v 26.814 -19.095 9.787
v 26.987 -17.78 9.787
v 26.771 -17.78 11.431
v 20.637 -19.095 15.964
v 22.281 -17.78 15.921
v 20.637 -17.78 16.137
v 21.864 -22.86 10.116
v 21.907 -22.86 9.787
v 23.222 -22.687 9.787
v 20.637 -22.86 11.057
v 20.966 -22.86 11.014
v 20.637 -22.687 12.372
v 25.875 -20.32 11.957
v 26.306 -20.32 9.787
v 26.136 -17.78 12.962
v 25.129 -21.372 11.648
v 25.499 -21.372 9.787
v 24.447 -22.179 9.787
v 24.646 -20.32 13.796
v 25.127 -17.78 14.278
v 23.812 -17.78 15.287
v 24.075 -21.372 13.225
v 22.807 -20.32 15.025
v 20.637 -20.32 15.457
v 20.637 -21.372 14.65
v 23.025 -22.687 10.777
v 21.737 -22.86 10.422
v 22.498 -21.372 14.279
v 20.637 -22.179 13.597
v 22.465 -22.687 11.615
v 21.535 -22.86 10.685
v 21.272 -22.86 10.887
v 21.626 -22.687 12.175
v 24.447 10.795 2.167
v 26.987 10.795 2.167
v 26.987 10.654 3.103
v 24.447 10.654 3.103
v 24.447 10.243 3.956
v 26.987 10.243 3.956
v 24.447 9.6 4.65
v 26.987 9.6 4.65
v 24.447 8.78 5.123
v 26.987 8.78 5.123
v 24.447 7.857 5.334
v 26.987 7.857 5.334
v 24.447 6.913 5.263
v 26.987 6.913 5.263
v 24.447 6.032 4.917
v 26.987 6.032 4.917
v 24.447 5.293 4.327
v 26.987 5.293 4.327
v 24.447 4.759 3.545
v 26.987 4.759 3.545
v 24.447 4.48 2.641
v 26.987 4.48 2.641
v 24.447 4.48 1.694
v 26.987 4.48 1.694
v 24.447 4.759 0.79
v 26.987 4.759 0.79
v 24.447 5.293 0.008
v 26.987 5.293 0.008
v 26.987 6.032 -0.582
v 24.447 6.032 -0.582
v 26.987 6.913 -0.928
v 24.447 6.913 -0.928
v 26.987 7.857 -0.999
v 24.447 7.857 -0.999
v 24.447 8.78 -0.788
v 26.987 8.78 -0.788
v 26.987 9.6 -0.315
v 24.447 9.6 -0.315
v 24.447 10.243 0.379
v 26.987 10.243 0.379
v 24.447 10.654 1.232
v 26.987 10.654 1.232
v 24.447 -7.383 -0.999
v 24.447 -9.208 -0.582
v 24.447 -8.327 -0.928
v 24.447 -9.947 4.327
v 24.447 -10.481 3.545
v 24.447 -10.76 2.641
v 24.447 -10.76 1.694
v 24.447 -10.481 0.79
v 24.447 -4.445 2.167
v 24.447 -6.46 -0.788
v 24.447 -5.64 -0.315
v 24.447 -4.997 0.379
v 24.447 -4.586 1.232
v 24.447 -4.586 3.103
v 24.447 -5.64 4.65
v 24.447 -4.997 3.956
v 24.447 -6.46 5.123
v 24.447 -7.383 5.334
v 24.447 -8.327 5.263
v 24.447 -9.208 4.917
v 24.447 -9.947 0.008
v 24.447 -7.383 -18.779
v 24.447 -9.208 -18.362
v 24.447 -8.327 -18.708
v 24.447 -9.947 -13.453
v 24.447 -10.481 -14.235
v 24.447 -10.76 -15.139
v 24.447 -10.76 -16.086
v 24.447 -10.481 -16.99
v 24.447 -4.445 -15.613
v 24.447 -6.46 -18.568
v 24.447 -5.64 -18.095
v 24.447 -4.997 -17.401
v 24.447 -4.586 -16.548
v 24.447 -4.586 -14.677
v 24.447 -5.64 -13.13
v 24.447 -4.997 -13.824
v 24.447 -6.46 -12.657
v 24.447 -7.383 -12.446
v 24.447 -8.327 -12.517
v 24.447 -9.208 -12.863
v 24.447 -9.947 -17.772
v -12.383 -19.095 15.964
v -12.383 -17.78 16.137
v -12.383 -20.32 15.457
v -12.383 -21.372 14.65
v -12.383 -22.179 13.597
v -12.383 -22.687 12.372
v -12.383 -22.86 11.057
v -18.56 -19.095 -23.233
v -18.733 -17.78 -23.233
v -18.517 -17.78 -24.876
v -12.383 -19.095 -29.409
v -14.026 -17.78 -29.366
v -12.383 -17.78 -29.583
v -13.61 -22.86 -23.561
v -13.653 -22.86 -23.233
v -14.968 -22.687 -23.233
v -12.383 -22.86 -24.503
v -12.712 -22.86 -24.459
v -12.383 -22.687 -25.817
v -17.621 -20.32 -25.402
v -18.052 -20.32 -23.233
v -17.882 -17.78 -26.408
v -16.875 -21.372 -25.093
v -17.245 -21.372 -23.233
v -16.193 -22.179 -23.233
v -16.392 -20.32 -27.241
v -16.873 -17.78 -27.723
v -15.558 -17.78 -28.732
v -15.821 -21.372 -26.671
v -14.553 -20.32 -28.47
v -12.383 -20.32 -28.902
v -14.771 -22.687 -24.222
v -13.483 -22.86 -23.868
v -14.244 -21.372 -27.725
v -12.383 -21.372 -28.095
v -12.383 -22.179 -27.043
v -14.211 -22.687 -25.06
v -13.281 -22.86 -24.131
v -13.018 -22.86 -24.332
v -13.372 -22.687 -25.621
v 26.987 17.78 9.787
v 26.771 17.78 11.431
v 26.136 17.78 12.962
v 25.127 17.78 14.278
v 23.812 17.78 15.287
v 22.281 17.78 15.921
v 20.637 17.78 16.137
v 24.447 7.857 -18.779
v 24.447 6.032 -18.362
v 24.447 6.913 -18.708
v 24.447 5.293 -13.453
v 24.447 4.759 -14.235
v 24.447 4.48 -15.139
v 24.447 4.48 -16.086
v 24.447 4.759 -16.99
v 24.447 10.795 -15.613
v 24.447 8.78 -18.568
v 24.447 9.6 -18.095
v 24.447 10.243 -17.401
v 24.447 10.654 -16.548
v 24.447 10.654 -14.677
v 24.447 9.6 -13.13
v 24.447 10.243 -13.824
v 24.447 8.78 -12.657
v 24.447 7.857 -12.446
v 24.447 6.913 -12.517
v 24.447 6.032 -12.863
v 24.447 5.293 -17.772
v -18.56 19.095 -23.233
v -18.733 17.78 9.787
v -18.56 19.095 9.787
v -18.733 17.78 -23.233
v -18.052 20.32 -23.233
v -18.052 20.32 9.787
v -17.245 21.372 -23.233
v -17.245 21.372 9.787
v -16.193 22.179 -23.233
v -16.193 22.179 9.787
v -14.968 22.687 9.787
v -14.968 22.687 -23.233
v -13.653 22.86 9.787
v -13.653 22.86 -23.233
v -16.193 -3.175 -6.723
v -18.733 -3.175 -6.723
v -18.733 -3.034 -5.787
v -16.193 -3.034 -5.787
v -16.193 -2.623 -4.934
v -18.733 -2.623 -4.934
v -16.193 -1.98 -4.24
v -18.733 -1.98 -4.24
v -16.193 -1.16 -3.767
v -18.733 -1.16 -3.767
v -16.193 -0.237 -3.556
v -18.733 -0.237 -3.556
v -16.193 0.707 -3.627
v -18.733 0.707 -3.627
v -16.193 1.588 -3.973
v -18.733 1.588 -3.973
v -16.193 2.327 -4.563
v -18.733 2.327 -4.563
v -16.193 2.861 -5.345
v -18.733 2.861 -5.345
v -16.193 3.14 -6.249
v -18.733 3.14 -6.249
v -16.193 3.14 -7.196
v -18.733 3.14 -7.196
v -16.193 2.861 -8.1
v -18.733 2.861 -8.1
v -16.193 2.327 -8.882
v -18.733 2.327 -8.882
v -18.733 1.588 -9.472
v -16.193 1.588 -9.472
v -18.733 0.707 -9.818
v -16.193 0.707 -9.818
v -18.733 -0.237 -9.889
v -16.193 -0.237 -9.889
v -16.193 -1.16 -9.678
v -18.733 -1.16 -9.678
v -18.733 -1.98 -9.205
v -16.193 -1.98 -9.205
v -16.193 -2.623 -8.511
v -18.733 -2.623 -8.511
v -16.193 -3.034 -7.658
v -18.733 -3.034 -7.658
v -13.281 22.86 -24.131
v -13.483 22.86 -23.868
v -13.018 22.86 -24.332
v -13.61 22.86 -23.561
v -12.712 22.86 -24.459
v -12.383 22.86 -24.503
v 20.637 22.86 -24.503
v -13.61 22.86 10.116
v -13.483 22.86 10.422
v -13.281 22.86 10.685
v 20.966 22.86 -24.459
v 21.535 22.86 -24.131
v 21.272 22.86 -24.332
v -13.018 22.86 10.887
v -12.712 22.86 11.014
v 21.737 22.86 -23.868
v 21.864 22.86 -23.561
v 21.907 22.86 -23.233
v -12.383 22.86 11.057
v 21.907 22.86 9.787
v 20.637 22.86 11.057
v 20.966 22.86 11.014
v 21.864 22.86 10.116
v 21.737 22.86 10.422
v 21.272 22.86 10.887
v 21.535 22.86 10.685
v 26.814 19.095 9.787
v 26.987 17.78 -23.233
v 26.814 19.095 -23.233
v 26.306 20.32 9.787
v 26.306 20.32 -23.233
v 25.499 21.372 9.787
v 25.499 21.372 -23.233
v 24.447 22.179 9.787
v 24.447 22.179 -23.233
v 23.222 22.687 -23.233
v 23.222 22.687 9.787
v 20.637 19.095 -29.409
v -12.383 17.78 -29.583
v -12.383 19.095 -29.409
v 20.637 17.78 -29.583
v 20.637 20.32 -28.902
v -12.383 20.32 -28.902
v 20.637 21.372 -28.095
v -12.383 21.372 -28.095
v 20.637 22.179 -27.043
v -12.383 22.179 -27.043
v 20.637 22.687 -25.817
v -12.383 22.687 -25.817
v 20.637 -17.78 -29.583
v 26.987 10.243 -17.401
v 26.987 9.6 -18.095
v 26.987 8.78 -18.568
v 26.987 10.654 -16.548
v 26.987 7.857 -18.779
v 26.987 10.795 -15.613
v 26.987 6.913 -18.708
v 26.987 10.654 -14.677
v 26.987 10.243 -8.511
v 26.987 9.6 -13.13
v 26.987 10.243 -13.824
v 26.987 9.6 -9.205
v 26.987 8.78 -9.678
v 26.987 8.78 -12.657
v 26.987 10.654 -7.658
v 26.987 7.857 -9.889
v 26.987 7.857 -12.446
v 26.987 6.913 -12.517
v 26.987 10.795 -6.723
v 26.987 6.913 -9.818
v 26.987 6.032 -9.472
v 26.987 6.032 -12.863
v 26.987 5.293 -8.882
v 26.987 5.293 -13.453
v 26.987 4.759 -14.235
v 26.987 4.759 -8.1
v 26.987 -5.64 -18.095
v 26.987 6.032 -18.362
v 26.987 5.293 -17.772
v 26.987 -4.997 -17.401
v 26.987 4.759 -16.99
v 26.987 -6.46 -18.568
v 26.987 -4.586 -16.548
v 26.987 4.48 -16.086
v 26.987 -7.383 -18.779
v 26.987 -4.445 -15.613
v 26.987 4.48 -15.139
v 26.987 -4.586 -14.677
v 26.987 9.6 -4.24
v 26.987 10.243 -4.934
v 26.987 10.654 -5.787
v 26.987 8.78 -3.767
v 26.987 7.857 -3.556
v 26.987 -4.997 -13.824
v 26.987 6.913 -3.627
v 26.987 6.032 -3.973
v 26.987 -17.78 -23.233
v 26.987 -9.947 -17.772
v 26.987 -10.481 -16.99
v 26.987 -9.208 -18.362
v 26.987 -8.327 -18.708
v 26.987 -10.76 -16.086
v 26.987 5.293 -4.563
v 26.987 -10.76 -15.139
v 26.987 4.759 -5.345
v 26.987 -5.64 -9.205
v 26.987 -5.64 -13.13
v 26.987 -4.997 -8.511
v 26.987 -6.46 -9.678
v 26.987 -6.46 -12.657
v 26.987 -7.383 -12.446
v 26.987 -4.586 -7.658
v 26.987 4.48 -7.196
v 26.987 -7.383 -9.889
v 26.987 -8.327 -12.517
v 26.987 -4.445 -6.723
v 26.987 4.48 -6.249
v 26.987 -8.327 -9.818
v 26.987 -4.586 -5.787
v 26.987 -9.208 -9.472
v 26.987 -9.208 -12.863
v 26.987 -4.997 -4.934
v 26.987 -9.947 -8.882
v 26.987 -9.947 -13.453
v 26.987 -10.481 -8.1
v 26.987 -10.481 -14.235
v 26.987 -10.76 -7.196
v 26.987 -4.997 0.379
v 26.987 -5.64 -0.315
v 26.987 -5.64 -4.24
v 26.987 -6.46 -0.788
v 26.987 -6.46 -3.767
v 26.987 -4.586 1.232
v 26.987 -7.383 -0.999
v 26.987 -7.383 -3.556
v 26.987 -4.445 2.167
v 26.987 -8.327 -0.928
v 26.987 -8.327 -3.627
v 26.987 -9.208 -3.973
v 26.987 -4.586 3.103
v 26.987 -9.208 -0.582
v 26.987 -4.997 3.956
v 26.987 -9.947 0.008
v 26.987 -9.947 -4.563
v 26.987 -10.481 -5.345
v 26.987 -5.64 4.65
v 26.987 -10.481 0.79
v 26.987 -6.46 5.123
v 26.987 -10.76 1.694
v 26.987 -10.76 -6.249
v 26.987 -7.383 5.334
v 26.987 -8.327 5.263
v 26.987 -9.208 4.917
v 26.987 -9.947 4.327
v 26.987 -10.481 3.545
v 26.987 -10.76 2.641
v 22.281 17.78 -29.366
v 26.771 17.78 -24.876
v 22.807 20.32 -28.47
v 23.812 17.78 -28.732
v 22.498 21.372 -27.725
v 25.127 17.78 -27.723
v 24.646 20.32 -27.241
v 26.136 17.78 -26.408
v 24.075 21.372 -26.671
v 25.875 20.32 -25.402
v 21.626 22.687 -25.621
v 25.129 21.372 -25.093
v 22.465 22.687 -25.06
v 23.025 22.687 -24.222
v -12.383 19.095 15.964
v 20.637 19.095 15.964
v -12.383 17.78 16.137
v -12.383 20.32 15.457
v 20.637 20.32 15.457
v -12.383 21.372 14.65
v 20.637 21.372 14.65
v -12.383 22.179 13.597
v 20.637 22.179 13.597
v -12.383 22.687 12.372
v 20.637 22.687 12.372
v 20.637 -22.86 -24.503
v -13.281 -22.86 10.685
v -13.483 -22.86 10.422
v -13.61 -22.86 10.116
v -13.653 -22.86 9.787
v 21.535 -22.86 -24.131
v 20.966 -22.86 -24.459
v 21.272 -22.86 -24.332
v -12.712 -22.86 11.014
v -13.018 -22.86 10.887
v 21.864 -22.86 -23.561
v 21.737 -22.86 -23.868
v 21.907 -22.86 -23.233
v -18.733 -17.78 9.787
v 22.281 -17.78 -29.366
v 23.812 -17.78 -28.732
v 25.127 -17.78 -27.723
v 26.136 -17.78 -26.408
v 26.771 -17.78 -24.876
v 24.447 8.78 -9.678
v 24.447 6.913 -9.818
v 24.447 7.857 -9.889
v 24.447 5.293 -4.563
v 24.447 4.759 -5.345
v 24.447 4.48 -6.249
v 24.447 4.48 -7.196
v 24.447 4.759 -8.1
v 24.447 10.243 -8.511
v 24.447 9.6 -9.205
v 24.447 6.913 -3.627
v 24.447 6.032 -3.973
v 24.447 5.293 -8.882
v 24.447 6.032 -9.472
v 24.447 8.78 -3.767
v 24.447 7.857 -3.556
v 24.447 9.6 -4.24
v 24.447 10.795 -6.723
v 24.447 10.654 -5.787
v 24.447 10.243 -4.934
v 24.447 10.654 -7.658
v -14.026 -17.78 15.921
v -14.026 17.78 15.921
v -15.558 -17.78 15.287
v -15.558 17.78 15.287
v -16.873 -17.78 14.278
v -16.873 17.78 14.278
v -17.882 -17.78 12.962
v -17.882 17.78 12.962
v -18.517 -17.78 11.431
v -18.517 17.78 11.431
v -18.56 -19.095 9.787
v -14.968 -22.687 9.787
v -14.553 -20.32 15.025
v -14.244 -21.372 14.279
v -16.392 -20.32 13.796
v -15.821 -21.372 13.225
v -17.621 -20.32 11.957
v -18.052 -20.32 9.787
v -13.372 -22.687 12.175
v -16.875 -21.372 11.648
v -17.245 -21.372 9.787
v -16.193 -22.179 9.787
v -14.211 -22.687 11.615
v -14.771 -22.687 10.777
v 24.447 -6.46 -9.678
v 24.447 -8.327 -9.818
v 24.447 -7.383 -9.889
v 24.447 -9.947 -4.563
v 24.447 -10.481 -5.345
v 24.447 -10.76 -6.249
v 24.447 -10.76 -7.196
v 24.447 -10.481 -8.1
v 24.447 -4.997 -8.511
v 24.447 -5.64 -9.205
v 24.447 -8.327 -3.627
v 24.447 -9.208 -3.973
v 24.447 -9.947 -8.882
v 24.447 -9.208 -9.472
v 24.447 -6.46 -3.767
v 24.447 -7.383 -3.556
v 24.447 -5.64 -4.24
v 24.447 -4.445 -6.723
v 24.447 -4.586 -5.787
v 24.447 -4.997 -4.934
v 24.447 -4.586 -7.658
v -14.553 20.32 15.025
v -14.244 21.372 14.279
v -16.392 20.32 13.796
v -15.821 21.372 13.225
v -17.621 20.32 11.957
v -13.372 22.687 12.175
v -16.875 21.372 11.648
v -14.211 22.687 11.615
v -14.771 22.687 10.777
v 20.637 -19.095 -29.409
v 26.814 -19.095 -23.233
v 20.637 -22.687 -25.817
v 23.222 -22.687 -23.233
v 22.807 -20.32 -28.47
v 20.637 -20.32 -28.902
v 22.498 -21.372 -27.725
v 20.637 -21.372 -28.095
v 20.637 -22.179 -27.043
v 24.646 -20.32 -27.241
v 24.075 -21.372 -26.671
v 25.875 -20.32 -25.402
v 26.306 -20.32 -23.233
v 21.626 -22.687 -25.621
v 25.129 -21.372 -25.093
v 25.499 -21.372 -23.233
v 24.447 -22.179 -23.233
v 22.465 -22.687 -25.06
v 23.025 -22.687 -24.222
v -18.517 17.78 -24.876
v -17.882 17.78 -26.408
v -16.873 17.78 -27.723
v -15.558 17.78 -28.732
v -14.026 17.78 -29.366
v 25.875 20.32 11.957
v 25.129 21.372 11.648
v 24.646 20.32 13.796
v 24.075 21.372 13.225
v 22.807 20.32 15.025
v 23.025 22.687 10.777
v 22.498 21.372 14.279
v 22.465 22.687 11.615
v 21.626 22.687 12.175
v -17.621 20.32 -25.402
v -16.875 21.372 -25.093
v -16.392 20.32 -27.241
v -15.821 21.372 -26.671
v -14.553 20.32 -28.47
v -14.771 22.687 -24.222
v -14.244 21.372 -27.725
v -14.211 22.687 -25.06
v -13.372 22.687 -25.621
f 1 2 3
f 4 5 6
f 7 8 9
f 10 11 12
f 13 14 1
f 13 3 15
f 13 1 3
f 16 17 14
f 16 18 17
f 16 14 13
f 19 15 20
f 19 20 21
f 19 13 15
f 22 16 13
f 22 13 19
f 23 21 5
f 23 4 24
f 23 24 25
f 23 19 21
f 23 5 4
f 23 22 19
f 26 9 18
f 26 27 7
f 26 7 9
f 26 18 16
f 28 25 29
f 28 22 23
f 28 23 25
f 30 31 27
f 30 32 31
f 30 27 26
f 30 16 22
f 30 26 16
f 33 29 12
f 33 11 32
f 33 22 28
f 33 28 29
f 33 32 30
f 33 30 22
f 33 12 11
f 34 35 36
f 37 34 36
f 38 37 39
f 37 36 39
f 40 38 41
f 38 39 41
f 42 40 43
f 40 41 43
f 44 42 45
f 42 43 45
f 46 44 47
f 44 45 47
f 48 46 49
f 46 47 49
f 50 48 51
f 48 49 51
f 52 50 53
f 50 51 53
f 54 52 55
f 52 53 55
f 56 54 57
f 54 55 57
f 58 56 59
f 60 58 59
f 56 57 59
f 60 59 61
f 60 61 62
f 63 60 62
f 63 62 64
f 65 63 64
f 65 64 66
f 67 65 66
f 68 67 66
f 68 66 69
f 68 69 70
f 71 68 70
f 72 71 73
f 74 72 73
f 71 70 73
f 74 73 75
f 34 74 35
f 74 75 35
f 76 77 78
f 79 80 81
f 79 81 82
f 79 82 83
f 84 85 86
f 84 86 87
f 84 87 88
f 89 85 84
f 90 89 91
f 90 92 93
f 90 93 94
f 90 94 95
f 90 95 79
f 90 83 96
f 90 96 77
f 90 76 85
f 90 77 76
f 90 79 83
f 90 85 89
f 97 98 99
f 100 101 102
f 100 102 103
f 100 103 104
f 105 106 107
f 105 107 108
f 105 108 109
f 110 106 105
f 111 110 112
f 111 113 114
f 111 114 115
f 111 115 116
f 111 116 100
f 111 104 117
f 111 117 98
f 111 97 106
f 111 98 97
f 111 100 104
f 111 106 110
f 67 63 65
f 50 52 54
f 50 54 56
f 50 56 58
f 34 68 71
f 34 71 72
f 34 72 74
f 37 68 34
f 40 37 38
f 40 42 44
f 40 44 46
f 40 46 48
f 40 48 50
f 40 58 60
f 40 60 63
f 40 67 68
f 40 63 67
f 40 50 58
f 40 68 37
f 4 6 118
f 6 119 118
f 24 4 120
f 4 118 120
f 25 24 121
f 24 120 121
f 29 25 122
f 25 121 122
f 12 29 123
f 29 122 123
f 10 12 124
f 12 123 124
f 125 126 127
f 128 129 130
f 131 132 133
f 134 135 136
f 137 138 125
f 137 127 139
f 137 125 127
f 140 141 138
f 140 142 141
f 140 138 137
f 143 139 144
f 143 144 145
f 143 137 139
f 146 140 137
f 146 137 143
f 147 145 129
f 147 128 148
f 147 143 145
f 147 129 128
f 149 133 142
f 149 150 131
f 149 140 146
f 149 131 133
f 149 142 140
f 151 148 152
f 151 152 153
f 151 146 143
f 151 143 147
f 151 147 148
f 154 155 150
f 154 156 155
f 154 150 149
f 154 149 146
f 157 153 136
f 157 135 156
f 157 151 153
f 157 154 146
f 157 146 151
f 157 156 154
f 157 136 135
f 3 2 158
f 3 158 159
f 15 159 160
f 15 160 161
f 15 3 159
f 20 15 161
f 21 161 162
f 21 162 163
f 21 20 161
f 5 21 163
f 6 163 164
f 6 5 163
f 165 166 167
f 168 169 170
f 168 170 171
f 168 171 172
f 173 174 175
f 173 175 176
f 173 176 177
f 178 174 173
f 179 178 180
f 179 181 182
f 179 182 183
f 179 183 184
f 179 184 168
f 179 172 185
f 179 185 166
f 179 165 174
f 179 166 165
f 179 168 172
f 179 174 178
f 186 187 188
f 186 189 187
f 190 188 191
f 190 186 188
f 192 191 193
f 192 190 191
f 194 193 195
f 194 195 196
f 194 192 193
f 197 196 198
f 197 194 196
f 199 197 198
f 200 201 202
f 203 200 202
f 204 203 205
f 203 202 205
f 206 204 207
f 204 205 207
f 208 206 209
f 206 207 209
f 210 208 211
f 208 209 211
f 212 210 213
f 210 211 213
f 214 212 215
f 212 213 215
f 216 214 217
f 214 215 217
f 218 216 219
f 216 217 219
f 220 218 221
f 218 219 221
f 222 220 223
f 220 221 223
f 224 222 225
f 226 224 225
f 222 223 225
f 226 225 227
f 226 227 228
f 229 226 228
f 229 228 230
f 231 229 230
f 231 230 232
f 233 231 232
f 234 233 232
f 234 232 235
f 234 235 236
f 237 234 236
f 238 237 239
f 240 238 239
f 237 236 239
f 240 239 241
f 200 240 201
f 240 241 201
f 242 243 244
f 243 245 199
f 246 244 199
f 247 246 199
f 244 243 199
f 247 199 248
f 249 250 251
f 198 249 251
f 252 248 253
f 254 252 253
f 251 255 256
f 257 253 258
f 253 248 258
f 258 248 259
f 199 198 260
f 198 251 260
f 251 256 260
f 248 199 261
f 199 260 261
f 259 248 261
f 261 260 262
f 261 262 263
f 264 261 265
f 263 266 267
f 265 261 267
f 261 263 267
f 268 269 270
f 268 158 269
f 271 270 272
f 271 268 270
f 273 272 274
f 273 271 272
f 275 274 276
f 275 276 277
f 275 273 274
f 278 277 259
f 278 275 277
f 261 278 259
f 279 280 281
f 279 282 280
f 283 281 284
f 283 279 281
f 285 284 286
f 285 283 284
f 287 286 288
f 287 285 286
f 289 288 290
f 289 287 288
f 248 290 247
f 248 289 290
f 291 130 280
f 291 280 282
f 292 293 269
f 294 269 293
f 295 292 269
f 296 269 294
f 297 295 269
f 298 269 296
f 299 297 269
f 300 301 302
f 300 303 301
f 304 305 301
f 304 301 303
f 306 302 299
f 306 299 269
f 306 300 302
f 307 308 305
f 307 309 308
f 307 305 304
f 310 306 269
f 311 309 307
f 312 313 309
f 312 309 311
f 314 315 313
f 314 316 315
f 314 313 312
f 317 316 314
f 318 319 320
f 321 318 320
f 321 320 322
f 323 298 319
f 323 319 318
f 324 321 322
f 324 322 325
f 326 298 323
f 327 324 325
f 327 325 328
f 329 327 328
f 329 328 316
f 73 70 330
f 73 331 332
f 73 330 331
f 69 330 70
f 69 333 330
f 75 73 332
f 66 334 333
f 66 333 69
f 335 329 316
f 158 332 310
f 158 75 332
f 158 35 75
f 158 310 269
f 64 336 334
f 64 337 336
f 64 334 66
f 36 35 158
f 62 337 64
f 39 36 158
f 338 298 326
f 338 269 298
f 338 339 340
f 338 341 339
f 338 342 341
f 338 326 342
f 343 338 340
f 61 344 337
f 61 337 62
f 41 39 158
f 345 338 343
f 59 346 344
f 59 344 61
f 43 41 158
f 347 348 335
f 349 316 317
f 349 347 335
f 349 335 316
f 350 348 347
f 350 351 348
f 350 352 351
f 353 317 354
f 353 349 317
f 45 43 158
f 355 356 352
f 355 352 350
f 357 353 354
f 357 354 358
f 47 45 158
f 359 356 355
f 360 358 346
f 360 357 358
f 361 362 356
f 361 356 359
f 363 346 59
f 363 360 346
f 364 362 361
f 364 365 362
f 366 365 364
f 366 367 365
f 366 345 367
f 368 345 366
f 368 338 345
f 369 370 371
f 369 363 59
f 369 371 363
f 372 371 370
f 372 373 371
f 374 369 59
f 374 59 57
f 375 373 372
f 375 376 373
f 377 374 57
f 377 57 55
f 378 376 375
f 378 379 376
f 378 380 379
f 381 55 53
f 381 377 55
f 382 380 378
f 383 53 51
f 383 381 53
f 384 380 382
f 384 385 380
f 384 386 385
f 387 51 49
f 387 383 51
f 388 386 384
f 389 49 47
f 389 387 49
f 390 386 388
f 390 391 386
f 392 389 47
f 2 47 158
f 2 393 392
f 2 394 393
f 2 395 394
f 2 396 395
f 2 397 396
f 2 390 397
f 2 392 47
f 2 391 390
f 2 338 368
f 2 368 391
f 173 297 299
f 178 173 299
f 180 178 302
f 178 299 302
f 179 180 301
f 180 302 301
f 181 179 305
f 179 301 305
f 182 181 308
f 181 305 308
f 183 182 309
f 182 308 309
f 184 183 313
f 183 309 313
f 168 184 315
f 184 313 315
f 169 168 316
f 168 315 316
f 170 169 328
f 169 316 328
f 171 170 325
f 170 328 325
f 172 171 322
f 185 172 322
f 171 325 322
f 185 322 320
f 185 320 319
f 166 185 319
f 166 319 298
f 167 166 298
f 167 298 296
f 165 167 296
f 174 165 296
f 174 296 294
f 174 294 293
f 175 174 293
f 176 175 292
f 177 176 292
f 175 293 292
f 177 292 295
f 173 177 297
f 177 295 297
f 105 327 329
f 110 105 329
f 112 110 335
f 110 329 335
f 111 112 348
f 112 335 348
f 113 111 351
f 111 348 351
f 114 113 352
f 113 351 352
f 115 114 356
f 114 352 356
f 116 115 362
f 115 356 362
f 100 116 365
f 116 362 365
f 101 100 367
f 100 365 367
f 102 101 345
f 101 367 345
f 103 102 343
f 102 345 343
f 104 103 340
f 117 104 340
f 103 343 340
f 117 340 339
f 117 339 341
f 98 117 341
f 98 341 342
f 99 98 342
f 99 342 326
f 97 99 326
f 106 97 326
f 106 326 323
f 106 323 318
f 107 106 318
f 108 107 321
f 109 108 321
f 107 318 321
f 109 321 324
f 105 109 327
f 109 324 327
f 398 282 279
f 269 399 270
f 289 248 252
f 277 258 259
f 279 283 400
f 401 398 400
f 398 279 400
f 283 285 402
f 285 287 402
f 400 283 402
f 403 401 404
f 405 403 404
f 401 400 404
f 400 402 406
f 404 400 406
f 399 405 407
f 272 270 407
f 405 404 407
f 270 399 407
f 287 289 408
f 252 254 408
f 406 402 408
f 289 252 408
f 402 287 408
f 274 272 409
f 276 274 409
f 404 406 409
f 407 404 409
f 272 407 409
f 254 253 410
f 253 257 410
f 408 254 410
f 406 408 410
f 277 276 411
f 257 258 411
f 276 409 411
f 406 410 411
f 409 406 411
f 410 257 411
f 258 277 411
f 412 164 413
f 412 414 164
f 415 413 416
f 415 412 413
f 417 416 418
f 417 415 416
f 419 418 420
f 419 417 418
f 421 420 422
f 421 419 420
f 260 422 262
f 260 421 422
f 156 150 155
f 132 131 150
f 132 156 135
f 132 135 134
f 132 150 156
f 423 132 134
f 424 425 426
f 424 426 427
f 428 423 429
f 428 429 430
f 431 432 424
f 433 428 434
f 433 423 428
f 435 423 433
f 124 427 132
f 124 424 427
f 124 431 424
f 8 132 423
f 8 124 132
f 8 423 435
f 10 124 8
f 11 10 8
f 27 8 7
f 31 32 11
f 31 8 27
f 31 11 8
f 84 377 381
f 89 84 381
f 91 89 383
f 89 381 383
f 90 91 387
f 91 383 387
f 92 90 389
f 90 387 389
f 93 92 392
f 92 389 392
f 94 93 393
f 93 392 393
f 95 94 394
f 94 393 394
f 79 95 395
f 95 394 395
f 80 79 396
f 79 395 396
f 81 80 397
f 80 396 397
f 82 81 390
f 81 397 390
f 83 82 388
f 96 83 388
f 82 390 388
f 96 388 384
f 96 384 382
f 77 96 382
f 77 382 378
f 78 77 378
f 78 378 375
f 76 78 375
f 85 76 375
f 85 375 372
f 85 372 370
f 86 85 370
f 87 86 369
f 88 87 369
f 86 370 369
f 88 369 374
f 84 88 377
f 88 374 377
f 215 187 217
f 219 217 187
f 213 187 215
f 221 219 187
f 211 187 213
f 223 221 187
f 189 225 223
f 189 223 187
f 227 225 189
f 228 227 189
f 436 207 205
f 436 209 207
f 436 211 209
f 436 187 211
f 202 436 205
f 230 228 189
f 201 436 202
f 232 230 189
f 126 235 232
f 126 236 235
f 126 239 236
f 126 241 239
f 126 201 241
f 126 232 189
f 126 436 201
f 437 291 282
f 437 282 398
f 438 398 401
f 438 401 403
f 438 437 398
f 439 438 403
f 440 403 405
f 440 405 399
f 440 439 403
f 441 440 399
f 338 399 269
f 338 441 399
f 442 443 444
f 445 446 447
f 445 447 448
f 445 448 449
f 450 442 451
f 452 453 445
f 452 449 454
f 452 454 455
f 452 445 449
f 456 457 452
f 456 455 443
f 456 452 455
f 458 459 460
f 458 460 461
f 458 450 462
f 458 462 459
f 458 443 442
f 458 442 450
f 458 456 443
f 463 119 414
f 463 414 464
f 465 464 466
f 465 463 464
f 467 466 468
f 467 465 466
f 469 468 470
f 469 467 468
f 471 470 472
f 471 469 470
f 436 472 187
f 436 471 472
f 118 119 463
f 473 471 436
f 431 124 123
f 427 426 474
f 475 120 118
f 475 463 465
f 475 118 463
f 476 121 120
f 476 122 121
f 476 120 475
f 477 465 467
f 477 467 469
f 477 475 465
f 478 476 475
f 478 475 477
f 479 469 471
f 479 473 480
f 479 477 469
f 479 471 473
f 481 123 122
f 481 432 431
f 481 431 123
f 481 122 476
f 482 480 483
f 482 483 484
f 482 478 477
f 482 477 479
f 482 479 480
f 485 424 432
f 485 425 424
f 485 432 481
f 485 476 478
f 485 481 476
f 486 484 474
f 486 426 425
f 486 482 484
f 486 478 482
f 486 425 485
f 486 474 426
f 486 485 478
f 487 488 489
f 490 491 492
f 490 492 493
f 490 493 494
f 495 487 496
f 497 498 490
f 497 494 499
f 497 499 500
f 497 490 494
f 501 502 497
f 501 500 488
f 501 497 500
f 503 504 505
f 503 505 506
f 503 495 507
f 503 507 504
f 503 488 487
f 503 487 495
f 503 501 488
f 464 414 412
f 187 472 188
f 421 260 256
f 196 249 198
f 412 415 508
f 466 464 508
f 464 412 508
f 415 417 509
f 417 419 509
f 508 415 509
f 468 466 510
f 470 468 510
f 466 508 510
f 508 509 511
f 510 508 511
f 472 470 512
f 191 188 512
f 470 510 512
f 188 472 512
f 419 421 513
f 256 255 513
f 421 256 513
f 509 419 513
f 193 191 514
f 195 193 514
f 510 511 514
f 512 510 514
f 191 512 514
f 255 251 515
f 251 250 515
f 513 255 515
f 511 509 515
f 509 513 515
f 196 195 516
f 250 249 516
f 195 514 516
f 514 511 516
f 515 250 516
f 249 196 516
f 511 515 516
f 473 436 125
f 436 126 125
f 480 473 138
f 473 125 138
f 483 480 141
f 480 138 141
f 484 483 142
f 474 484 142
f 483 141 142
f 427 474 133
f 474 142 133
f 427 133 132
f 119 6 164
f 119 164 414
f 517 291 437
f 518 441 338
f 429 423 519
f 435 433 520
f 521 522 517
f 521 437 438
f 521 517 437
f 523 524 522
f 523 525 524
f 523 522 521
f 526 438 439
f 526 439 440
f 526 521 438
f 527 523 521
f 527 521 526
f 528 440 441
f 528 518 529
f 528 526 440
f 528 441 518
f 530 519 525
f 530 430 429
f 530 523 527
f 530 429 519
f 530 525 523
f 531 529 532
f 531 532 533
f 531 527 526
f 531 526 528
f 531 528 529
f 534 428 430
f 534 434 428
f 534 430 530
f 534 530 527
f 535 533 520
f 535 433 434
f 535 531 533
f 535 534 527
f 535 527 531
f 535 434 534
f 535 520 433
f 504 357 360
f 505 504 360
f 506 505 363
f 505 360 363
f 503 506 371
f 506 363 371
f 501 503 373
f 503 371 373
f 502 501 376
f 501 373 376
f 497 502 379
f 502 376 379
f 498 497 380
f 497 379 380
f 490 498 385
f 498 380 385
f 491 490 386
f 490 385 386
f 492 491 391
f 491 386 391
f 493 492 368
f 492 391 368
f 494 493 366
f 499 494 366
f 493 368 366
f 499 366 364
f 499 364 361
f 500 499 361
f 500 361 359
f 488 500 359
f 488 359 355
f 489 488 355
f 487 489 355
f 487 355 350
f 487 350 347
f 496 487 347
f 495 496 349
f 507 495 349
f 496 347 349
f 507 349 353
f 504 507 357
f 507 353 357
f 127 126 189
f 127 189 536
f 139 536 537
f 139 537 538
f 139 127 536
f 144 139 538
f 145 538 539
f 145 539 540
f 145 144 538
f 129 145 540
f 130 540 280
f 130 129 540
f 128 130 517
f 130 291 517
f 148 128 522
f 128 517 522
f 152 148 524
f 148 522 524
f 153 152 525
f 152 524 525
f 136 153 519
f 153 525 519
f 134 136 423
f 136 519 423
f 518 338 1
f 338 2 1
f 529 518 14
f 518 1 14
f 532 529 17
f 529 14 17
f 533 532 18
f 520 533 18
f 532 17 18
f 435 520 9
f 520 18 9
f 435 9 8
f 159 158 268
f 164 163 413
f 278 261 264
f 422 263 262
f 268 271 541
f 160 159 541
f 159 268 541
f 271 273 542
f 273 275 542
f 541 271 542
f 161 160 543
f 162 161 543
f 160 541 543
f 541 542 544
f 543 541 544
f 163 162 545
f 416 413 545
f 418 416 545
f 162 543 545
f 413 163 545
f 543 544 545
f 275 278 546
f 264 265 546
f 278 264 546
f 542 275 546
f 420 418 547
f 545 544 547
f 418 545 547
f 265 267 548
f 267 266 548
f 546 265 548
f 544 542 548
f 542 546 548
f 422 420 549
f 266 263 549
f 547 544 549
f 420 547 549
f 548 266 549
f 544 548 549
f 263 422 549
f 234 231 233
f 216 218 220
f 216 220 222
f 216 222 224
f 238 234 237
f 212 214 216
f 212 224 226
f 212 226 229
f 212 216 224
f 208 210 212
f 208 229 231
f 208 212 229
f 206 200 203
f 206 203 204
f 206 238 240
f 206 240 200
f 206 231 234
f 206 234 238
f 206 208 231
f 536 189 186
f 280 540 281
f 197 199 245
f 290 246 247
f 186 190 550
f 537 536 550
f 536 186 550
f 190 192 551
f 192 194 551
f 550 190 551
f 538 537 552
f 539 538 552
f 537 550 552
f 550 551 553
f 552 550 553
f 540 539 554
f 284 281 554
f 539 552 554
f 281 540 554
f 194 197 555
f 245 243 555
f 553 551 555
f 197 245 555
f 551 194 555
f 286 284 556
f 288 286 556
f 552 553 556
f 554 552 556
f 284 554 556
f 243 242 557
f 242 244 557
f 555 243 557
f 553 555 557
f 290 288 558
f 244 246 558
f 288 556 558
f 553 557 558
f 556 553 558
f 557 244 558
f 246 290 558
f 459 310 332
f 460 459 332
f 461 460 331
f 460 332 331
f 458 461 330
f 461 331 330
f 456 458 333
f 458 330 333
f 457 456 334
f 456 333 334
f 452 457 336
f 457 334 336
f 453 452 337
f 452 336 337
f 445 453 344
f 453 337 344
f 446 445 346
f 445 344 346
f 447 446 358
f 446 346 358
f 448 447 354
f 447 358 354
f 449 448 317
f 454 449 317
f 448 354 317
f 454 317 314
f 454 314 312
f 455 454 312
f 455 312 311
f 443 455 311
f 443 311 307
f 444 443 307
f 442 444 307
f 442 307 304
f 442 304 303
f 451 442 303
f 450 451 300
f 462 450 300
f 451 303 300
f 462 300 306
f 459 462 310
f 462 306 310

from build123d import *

# Parameters (mm, degrees)
F1_DEPTH = 22.86
F2_R     = 5.08
F3_R     = 3.175
F4_DEPTH = 2.54
F5_R     = 3.175
F6_DEPTH = 2.54


with BuildPart() as f1:
    # F0 (on Front) → F1 (new body, symmetric)
    with BuildSketch(Plane.XZ):
        with BuildLine():
            Line((20.637052, 16.137419), (-12.382948, 16.137419))
            ThreePointArc((-12.382948, 16.137419), (-16.873076, 14.277547), (-18.732948, 9.787419))
            Line((-18.732948, 9.787419), (-18.732948, -23.232581))
            ThreePointArc((-18.732948, -23.232581), (-16.873076, -27.722709), (-12.382948, -29.582581))
            Line((-12.382948, -29.582581), (20.637052, -29.582581))
            ThreePointArc((20.637052, -29.582581), (25.12718, -27.722709), (26.987052, -23.232581))
            Line((26.987052, -23.232581), (26.987052, 9.787419))
            ThreePointArc((26.987052, 9.787419), (25.12718, 14.277547), (20.637052, 16.137419))
        make_face()
    extrude(amount=F1_DEPTH, both=True)

    # F2
    f2_edges = [f1.edges().sort_by_distance(p)[0] for p in [
        (4.127052, -22.86, 16.137419),
        (4.127052, 22.86, 16.137419),
    ]]
    fillet(f2_edges, radius=F2_R)

    # F3 (on face) → F4 (cut)
    with BuildSketch(Plane(origin=(-18.732948, 0, 0), x_dir=(0, -1, 0), z_dir=(-1, 0, 0))):
        with Locations((0, -6.722581)):
            Circle(F3_R)
    extrude(amount=-F4_DEPTH, mode=Mode.SUBTRACT)

    # F5 (on face) → F6 (cut)
    with BuildSketch(Plane.YZ.offset(26.987052)):
        with Locations((-7.62, 2.167419)):
            Circle(F5_R)
        with Locations((7.62, 2.167419)):
            Circle(F5_R)
        with Locations((7.62, -6.722581)):
            Circle(F5_R)
        with Locations((-7.62, -6.722581)):
            Circle(F5_R)
        with Locations((-7.62, -15.612581)):
            Circle(F5_R)
        with Locations((7.62, -15.612581)):
            Circle(F5_R)
    extrude(amount=-F6_DEPTH, mode=Mode.SUBTRACT)


solid = f1.part
